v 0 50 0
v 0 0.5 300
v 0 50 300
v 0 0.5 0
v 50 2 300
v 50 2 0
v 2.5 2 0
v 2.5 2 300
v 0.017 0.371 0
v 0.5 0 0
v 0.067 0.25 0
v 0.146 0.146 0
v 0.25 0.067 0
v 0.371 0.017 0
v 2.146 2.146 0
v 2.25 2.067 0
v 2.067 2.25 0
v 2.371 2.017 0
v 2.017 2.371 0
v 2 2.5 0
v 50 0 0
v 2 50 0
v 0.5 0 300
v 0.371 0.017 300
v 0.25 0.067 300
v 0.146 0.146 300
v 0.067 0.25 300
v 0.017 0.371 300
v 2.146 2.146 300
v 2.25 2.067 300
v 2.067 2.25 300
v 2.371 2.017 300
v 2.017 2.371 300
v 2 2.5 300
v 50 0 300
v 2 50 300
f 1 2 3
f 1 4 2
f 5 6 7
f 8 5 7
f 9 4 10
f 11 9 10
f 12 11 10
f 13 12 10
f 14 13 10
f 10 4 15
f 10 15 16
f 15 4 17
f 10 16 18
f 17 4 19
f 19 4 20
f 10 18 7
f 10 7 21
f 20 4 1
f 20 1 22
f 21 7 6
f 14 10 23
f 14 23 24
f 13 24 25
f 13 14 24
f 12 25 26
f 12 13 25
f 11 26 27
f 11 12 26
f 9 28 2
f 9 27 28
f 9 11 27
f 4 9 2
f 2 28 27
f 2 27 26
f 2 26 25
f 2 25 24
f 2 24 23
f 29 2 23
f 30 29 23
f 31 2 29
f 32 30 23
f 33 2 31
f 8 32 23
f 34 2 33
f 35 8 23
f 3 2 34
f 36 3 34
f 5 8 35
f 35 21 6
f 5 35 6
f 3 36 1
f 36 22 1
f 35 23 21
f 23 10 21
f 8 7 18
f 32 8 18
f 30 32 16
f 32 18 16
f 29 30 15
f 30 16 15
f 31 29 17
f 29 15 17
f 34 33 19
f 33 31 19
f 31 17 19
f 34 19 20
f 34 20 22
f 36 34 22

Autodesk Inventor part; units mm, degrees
ref_plane "YZ Plane" through (0, 0, 0) normal (1, 0, 0) x (0, 1, 0)
ref_plane "XZ Plane" through (0, 0, 0) normal (0, 1, 0) x (-1, 0, 0)
ref_plane "XY Plane" through (0, 0, 0) normal (0, 0, 1) x (1, 0, 0)
sketch "Szkic1" plane through (0, 0, 0) normal (0, 0, 1) x (1, 0, 0)
  line L0 (-10.1243, 0) -> (60.0207, 0) projected
  line L1 (0, -10.1243) -> (0, 60.0207) projected
  line L2 (0, 50) -> (0, 0.5)
  line L3 (0.5, 0) -> (50, 0)
  line L4 (50, 2) -> (2.5, 2)
  line L5 (2, 2.5) -> (2, 50)
  line L6 (2, 50) -> (0, 50)
  line L7 (50, 0) -> (50, 2)
  arc A0 (2, 2.5) -> (2.5, 2) centre (2.5, 2.5) ccw
  arc A1 (0, 0.5) -> (0.5, 0) centre (0.5, 0.5) ccw
  point P0 (0, 0)
  dimension "d0" = 2
  dimension "d2" = 2
  dimension "d3" = 50
  dimension "d4" = 50
  dimension "d5" = 0.5
extrude "Wyciągnięcie proste1" add sketch "Szkic1" along normal blind 300 contours A1 L1 L6 L5 A0 L4 L7 L0
properties part number "kątownik 1" material "Aluminium 6061"
